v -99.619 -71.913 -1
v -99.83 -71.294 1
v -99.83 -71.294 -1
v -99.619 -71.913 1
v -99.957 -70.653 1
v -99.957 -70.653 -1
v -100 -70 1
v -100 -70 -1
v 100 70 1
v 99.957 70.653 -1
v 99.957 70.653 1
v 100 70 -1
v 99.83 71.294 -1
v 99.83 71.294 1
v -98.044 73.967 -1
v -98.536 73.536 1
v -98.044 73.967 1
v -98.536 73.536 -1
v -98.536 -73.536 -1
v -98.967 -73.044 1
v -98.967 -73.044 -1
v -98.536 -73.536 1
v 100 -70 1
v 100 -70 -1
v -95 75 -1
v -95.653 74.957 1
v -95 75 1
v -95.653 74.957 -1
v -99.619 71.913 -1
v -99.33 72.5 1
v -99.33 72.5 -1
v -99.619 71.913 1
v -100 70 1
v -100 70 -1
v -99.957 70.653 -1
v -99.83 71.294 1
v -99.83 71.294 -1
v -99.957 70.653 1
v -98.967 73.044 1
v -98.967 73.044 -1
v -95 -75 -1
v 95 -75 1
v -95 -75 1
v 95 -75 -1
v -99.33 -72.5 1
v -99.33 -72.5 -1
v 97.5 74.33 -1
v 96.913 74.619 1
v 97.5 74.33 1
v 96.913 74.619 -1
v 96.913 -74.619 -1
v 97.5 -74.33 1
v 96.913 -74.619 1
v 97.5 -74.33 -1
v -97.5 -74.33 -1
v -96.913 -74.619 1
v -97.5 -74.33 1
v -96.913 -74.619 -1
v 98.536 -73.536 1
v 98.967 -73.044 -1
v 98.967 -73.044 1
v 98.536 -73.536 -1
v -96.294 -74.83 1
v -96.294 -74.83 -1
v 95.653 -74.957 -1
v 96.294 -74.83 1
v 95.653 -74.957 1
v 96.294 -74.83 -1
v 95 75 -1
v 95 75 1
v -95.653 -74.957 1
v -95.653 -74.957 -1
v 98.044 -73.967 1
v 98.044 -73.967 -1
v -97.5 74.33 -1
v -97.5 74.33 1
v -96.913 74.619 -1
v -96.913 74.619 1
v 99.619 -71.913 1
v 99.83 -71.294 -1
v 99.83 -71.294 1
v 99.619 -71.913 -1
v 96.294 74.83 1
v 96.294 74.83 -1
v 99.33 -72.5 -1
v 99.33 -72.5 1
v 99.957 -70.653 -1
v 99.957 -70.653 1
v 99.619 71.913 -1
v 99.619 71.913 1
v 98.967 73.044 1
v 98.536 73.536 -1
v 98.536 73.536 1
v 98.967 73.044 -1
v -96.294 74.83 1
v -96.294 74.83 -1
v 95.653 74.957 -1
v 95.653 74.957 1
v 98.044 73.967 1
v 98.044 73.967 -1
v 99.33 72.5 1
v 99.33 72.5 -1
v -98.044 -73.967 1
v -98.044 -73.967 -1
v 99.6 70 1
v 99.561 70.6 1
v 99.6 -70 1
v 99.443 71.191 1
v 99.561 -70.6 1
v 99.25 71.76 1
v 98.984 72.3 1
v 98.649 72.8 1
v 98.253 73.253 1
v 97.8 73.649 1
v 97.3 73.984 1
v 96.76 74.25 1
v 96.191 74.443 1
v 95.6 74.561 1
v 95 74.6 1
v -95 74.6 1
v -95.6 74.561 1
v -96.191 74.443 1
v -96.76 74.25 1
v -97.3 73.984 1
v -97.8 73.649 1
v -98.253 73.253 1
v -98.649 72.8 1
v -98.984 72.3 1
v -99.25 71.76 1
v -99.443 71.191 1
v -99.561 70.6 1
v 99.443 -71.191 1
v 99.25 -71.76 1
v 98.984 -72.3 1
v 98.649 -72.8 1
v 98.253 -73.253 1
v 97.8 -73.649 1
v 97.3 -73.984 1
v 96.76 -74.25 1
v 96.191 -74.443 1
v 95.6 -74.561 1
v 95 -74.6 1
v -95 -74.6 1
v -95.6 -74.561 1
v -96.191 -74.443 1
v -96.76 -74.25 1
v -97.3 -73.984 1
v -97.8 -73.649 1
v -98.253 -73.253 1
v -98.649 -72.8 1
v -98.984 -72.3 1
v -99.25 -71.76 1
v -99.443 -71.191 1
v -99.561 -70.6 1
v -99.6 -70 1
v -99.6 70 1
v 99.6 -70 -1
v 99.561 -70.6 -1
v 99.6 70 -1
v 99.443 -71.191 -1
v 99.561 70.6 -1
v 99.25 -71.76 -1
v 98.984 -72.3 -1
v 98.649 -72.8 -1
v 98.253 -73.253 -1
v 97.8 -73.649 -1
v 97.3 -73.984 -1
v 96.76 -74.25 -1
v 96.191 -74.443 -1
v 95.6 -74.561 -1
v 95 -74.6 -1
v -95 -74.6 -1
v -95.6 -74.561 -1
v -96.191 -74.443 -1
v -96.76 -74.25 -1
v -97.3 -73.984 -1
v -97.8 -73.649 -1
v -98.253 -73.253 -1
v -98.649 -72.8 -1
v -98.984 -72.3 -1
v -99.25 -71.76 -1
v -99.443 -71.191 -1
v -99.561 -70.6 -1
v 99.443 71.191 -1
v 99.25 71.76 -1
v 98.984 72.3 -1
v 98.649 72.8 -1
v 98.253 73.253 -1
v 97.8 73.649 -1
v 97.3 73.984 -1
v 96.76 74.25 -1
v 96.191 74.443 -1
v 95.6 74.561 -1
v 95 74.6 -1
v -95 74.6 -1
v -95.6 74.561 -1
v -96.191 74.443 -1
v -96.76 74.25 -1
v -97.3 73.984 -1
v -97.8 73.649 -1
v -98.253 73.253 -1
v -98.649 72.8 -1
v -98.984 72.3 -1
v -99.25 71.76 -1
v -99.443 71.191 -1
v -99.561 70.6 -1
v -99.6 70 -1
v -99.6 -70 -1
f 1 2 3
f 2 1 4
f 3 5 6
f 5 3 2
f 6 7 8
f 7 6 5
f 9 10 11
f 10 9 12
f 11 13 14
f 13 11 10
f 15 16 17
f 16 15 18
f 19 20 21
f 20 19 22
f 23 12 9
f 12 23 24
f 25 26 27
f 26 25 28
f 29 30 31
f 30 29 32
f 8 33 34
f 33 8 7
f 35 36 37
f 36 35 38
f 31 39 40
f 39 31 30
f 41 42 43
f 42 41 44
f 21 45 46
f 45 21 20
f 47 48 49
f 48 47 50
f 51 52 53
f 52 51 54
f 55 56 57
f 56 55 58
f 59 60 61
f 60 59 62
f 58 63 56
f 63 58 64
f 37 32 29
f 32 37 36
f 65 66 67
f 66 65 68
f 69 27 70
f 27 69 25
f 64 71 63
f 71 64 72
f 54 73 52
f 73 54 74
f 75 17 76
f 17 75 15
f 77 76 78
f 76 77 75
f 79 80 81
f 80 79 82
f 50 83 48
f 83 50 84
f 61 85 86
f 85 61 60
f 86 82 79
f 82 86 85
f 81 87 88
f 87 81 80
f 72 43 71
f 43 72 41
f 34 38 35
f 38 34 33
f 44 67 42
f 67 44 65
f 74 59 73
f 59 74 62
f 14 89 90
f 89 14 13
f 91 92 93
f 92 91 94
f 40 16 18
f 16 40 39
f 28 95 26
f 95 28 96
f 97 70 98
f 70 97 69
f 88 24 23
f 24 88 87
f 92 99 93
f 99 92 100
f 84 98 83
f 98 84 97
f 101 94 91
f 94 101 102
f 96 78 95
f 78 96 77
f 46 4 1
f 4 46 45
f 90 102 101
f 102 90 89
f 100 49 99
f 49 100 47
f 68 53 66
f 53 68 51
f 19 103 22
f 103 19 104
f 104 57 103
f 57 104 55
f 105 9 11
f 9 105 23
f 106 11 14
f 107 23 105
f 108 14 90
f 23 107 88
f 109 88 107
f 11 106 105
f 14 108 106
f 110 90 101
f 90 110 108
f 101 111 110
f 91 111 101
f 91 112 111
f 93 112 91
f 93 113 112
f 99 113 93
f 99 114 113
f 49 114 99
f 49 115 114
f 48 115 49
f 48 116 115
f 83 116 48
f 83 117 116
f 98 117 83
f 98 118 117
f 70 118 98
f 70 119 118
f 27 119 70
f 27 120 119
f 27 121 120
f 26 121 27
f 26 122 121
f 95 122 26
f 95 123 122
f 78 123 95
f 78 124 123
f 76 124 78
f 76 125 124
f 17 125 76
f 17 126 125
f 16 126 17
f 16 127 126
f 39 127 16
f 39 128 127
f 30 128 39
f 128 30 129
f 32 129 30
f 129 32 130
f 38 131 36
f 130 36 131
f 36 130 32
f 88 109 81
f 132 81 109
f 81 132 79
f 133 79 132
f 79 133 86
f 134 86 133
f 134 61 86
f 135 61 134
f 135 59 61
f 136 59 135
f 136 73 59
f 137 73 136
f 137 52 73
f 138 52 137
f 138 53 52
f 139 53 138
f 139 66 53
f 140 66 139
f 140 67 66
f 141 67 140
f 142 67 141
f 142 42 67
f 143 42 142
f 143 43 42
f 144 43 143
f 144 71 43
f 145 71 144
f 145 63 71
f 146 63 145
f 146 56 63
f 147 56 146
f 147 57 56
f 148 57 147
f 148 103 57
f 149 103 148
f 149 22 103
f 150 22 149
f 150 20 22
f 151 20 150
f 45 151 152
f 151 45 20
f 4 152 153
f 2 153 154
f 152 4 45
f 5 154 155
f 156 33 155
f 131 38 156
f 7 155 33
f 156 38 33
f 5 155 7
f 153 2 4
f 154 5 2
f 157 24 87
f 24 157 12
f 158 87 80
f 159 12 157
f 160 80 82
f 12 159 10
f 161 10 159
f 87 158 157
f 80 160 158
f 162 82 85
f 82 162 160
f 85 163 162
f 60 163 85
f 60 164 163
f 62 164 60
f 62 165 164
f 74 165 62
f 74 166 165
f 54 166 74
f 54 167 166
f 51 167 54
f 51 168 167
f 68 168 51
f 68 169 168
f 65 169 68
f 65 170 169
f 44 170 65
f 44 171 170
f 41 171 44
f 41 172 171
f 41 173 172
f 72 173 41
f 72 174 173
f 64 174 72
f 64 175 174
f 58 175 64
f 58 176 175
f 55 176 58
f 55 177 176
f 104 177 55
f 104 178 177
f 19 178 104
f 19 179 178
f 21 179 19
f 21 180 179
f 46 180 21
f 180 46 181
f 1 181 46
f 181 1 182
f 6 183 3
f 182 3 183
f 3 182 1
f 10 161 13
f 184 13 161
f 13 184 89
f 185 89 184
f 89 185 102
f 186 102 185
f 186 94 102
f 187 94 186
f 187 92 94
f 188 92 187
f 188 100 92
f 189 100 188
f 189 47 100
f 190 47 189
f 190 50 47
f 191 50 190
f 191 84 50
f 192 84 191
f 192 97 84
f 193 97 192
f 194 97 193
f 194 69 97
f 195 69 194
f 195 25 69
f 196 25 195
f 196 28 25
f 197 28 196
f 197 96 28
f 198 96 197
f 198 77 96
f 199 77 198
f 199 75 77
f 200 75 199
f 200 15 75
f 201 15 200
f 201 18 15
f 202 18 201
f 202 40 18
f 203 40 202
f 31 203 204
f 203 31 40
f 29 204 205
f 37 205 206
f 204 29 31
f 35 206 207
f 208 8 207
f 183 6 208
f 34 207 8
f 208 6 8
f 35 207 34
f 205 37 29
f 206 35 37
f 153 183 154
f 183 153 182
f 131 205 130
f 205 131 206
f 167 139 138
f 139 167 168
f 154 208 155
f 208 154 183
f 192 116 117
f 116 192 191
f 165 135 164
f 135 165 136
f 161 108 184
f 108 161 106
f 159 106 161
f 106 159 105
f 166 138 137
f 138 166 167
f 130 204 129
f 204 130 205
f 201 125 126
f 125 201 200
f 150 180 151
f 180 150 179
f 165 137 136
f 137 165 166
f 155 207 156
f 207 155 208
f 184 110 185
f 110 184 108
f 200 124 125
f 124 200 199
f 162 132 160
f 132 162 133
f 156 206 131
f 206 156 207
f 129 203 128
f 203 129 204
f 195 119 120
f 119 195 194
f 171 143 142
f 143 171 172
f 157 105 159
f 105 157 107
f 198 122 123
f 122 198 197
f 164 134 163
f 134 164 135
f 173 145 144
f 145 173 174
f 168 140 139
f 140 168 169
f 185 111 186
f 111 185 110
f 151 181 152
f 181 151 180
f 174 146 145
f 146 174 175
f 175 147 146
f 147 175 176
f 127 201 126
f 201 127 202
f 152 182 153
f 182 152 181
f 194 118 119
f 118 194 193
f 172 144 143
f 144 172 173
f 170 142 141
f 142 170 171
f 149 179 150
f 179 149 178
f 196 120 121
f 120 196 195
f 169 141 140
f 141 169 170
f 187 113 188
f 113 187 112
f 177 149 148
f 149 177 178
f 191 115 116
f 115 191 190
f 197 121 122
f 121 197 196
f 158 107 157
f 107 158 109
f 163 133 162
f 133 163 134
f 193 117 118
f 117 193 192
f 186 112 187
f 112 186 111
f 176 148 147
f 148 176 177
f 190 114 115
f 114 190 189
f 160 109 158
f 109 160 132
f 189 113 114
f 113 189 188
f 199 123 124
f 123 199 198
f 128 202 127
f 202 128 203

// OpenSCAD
// Sheet silicone (plain sheet, single connected solid, no text/labels)
// Fixes:
// - Removed perforation/texture pattern and central raised pad
// - Simple rounded-rectangle sheet with optional subtle edge fillet/chamfer-like bevel
// - One watertight solid

// ---------- Parameters ----------
sheet_length    = 200; //[100:400:1]
sheet_width     = 150; //[75:300:1]
sheet_thickness = 2;   //[1:6:0.5]

corner_radius   = 5;   //[0:20:0.5]
corner_segments = 48;  //[8:128:1]

// Small bevel amount (0 = none). Implemented as a true cut.
edge_bevel      = 0.4; //[0:2:0.05]

// ---------- Helpers ----------
function clamp(v, lo, hi) = v < lo ? lo : (v > hi ? hi : v);

$fn = corner_segments;

r_eff = clamp(corner_radius, 0, min(sheet_length, sheet_width)/2);

// 2D rounded rectangle (watertight via hull)
module rounded_rect_2d(L, W, R) {
  if (R <= 0) {
    square([L, W], center=true);
  } else {
    hull() {
      for (sx = [-1, 1], sy = [-1, 1])
        translate([sx*(L/2 - R), sy*(W/2 - R)])
          circle(r=R);
    }
  }
}

// Base sheet
module sheet_body() {
  linear_extrude(height=sheet_thickness, center=true, convexity=10)
    rounded_rect_2d(sheet_length, sheet_width, r_eff);
}

// Optional subtle bevel by subtracting a slightly smaller, slightly taller inner solid
module sheet_with_bevel() {
  b = clamp(edge_bevel, 0, min(sheet_thickness/2, min(sheet_length, sheet_width)/10));
  if (b <= 0) {
    sheet_body();
  } else {
    difference() {
      sheet_body();
      // Inner cut removes material near the perimeter on both faces, leaving a beveled rim
      linear_extrude(height=sheet_thickness + 2*b, center=true, convexity=10)
        rounded_rect_2d(
          sheet_length - 2*b,
          sheet_width  - 2*b,
          max(r_eff - b, 0)
        );
    }
  }
}

// ---------- Final Model ----------
color([0.92, 0.92, 0.88, 0.65])
sheet_with_bevel();
